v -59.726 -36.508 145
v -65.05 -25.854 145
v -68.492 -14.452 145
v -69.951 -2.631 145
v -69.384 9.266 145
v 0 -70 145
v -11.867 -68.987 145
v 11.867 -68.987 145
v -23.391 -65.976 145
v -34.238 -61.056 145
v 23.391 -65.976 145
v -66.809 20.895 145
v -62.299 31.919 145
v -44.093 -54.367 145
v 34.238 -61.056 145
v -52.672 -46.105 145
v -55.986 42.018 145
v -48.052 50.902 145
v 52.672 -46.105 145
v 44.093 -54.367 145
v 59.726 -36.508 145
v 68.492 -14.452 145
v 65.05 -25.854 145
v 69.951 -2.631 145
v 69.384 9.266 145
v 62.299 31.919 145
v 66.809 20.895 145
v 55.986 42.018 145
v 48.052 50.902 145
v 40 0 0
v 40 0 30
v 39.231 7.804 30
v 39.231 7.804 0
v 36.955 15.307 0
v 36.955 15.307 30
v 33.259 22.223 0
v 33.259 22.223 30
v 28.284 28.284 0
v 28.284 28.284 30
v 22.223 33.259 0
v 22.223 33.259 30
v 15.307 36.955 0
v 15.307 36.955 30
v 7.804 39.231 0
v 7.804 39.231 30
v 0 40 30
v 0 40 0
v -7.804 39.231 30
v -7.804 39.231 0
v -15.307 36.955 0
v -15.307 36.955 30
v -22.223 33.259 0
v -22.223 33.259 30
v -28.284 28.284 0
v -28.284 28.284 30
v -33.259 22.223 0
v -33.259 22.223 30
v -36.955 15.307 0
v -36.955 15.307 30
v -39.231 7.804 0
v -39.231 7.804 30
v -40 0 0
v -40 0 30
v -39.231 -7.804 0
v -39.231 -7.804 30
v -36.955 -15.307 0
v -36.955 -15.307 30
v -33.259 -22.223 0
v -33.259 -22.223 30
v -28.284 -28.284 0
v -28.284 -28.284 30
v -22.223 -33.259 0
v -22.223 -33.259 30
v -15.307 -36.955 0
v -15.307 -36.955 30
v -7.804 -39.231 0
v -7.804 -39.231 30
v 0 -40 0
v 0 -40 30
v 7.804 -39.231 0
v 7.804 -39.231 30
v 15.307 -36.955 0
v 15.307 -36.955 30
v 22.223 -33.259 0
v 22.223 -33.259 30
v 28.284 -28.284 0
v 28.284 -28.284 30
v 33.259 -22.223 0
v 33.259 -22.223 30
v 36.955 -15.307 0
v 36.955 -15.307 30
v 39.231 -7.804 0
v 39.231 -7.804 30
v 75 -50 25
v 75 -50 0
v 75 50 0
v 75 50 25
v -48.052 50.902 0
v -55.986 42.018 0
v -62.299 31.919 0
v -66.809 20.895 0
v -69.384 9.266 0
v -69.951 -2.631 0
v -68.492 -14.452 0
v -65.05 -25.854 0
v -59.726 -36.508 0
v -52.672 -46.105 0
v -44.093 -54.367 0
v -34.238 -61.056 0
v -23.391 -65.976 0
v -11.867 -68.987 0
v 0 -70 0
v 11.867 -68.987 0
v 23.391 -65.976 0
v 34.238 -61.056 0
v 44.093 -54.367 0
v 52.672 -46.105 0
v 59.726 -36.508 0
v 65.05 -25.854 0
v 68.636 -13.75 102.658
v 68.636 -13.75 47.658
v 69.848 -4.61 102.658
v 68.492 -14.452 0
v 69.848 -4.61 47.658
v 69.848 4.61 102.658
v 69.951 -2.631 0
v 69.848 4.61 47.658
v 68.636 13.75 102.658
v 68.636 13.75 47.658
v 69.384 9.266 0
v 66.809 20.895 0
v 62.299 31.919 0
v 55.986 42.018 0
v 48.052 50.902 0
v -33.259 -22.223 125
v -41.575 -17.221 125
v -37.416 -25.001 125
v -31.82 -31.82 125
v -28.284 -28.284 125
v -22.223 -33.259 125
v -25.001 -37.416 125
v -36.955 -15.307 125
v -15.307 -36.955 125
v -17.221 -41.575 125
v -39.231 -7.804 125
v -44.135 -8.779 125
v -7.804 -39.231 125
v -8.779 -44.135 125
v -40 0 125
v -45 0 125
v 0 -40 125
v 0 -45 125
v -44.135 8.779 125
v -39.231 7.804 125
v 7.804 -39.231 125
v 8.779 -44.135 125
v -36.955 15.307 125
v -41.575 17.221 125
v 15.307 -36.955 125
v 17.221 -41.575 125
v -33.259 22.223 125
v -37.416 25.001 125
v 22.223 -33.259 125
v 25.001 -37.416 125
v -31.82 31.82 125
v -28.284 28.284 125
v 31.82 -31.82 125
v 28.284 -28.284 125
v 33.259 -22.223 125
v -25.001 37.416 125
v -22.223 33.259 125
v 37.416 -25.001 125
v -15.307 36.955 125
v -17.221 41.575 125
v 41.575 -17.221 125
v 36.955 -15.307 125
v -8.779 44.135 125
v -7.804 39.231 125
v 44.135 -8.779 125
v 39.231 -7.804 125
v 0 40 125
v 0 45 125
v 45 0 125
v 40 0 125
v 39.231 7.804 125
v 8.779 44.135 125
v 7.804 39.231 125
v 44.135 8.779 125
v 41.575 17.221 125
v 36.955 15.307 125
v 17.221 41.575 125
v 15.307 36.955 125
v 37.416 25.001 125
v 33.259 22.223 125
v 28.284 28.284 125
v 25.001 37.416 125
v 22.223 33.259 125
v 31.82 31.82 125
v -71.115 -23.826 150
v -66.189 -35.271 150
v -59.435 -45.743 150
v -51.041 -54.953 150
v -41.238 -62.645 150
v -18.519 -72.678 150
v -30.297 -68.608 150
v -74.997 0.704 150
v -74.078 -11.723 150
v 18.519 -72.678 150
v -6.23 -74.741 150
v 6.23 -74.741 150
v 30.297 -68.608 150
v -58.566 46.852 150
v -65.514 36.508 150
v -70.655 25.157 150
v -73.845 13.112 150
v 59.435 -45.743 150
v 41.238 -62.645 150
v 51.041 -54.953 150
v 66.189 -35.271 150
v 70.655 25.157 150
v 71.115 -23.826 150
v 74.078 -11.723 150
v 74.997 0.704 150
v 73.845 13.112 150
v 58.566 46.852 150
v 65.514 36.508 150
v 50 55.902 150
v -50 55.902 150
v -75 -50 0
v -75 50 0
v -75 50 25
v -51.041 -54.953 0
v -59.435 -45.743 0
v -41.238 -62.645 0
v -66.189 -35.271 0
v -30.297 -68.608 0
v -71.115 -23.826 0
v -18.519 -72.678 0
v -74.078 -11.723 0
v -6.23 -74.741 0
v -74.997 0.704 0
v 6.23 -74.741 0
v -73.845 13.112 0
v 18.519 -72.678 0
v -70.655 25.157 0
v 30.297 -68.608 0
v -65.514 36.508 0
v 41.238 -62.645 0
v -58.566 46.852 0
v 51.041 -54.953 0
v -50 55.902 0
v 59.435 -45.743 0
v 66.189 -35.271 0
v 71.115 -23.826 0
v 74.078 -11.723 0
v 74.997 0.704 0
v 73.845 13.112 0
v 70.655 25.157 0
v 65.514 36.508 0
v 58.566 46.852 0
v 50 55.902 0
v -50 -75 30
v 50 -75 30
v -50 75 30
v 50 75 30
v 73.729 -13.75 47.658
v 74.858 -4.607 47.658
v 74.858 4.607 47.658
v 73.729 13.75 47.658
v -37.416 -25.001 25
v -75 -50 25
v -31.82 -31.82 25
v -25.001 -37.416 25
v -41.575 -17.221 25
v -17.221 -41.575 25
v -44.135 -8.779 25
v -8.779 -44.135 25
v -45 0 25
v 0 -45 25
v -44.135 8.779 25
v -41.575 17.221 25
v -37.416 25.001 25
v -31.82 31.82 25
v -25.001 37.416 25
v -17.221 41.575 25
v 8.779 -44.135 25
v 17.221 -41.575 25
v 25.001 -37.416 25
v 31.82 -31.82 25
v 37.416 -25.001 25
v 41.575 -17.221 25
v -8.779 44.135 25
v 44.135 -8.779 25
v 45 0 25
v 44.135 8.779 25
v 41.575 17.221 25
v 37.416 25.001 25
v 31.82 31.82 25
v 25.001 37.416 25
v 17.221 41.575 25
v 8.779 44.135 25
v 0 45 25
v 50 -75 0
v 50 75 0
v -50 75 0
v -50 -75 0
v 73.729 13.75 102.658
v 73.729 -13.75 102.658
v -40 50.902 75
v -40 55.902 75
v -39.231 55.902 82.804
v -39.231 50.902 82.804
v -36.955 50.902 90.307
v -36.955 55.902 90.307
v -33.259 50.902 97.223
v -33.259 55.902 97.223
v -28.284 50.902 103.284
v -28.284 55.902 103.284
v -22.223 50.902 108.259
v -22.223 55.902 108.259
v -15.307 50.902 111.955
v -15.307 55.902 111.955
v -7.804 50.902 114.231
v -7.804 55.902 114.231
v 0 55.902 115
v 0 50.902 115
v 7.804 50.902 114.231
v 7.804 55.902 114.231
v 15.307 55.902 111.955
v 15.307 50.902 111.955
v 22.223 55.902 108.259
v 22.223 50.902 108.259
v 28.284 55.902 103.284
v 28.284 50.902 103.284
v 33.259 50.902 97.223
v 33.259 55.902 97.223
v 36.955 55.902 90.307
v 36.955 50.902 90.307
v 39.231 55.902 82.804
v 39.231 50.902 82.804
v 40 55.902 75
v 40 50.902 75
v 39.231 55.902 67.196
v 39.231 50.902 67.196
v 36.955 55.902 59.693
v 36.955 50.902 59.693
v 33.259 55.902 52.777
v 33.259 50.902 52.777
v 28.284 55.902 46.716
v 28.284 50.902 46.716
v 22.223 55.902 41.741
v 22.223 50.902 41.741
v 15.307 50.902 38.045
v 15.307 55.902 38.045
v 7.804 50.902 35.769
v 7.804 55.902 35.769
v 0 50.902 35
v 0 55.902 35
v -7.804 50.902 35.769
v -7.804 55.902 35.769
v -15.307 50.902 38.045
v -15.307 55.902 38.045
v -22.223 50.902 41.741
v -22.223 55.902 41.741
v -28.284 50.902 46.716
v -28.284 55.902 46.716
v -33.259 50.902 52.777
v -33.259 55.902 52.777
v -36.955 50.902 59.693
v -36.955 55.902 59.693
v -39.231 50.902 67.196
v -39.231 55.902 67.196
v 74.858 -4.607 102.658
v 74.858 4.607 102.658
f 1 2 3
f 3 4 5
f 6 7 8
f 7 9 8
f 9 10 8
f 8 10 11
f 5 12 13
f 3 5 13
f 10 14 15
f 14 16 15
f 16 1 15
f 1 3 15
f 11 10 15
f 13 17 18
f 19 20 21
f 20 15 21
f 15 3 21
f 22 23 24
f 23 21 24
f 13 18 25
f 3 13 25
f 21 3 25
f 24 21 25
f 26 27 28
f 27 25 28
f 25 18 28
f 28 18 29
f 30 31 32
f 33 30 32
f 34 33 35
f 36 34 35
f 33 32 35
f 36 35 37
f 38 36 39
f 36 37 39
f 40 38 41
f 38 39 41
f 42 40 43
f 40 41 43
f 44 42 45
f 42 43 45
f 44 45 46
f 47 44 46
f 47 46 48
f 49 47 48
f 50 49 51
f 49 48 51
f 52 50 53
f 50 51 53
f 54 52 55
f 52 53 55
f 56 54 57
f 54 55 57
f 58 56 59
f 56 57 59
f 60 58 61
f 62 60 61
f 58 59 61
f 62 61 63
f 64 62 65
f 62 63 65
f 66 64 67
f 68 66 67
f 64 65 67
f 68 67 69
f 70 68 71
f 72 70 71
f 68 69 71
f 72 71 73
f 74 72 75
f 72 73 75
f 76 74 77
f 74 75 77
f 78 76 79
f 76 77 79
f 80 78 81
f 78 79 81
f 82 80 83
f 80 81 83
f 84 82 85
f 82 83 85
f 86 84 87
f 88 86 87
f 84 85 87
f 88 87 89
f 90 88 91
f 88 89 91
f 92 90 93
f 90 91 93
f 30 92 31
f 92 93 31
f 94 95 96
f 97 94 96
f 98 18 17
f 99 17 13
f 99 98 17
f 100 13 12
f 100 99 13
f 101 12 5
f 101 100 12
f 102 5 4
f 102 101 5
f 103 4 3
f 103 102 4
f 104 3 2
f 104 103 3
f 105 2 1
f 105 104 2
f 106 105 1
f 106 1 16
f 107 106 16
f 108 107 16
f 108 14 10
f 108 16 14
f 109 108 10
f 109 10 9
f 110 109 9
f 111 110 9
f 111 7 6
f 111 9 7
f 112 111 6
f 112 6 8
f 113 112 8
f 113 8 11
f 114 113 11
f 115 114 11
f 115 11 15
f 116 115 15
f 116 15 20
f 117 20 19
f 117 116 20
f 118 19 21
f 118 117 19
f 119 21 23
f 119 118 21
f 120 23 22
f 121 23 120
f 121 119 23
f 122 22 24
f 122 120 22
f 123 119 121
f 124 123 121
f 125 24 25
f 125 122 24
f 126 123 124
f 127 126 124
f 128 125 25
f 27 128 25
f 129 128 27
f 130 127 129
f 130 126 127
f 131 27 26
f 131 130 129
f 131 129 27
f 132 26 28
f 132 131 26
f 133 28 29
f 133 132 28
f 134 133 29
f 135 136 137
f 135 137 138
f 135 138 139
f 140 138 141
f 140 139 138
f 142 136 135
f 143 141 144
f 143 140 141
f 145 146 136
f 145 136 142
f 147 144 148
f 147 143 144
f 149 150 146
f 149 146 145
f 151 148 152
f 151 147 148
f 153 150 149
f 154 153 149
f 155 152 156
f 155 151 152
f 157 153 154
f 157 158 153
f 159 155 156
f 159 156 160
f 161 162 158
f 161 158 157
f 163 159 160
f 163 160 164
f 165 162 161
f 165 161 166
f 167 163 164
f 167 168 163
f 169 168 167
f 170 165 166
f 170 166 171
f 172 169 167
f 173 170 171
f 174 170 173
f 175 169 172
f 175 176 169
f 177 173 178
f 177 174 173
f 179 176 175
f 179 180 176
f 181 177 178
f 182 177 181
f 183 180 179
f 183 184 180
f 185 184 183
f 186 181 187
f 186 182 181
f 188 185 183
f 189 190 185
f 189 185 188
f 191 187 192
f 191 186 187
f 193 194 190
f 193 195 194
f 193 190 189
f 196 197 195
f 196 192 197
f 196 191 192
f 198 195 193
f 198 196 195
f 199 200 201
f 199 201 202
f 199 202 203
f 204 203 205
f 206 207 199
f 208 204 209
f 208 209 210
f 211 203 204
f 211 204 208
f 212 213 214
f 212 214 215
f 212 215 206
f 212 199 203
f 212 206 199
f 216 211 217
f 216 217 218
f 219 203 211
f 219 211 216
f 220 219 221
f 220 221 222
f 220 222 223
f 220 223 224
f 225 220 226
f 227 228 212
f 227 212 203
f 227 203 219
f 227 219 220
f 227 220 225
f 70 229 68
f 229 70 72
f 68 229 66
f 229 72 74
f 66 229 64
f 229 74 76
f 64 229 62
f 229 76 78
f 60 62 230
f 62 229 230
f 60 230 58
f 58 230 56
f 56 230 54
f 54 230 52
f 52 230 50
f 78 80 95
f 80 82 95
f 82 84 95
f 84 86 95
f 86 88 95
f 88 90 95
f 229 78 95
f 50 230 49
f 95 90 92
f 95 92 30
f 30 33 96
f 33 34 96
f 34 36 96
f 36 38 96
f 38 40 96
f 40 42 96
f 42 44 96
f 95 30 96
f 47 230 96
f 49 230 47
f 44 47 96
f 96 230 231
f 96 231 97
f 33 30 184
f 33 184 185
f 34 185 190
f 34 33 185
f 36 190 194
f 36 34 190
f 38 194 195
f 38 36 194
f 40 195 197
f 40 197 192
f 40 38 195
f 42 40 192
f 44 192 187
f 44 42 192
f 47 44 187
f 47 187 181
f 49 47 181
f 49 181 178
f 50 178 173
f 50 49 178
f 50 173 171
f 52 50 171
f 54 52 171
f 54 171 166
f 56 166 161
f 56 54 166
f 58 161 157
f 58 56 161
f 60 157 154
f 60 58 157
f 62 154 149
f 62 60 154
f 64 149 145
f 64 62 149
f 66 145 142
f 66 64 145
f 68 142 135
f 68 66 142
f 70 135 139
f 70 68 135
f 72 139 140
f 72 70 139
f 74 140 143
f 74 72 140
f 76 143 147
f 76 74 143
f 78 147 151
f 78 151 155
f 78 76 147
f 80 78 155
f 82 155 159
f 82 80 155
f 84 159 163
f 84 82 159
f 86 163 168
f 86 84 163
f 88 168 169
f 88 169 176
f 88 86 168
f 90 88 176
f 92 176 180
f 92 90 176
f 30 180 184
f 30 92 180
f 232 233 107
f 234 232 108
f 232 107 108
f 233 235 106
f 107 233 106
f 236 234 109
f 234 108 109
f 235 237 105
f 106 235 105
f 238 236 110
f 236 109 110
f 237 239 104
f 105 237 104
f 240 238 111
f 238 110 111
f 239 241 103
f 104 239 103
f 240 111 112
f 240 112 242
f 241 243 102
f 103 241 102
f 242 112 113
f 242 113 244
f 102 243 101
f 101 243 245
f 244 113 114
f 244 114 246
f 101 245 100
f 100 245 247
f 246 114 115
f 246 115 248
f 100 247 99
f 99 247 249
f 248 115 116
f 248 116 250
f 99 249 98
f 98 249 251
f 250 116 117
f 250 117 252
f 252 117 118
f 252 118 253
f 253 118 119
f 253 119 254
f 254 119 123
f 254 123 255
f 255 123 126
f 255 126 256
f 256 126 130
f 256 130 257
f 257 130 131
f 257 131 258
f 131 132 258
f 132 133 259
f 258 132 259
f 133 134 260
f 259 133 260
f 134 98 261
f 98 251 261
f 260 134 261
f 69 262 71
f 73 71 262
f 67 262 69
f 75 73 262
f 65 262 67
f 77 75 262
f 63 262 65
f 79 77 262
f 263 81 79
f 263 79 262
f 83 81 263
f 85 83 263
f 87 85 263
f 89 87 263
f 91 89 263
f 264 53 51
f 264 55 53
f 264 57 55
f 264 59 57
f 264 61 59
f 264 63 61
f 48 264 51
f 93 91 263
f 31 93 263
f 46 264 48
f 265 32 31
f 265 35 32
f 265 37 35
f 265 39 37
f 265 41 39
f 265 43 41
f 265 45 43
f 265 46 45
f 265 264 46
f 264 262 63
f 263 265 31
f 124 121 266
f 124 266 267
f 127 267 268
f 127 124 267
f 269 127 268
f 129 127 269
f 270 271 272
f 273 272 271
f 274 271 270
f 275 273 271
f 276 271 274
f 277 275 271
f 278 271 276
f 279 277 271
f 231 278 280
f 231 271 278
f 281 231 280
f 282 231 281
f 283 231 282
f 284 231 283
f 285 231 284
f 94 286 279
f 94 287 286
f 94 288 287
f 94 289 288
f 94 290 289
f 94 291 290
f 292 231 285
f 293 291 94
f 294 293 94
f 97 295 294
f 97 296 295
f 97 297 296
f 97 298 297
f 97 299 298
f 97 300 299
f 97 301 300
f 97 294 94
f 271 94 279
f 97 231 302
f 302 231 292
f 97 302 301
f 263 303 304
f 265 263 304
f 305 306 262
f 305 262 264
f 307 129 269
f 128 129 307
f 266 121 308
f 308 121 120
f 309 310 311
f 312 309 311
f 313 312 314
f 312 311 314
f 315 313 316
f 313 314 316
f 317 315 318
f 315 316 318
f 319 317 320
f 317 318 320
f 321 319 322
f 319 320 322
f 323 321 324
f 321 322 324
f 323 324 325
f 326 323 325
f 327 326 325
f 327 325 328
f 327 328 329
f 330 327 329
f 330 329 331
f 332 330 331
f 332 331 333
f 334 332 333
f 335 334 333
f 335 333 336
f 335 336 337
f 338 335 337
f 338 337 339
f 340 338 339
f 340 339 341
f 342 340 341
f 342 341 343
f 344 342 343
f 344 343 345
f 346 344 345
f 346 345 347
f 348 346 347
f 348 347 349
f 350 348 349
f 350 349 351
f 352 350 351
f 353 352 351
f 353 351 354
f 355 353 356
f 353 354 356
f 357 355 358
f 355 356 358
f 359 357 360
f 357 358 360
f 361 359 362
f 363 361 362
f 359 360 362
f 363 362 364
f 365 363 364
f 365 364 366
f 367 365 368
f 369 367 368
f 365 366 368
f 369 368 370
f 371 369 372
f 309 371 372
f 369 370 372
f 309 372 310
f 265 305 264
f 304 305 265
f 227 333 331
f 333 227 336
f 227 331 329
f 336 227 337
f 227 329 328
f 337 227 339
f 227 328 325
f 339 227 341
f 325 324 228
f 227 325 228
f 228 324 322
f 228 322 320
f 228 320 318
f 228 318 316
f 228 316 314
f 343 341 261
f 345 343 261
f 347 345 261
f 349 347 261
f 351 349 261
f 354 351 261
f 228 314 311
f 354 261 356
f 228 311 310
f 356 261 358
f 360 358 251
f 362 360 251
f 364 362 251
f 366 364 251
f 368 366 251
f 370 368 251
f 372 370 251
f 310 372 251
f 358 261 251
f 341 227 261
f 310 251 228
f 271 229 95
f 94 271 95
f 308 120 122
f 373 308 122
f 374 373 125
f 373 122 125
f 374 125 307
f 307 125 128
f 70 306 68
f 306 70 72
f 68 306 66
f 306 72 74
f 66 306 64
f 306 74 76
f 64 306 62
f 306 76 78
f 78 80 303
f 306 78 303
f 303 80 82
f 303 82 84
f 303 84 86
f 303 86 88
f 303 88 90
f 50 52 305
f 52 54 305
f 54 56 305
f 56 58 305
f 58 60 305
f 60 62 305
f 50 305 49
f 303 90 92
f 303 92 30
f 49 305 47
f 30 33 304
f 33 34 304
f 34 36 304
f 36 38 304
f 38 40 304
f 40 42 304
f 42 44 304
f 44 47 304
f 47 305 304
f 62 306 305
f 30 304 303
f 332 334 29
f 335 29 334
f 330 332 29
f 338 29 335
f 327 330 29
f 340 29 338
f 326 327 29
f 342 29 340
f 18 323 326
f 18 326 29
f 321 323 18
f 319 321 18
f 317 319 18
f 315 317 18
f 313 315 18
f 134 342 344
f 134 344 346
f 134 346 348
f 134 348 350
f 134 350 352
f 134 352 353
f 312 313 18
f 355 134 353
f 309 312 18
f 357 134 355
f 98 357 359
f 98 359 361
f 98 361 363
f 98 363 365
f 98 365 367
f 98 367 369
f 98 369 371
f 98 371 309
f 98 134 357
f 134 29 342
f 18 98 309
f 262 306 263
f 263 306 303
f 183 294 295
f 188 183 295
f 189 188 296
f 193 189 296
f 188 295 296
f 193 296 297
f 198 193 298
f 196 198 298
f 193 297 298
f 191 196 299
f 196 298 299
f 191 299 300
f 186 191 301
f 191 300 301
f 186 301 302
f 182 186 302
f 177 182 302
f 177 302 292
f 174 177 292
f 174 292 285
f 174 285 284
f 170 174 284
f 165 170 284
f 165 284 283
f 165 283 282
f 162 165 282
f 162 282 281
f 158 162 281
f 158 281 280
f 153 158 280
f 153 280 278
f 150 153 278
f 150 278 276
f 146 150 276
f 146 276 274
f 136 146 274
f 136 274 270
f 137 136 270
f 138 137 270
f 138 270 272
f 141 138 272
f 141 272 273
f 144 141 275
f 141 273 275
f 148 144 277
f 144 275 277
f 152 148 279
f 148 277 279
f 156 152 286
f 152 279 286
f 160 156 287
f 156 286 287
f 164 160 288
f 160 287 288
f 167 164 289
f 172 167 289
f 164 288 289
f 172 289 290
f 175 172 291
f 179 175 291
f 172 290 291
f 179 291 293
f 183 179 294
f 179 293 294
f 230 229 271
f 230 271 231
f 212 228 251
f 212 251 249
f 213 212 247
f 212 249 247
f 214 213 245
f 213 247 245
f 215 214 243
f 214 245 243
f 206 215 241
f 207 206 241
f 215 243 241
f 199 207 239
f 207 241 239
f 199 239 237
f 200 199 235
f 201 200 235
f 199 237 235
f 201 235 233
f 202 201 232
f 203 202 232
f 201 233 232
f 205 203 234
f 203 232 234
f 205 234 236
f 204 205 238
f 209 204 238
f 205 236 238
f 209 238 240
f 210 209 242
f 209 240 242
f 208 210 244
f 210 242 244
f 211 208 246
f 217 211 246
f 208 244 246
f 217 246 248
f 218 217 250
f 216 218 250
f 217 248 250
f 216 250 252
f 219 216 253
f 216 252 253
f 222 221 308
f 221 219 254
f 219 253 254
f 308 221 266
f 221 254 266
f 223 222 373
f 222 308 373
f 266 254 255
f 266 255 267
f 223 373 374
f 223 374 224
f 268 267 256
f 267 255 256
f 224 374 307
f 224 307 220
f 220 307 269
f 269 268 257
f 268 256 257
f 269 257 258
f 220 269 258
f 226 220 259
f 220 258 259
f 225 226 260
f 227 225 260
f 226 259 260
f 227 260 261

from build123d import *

# Parameters (mm, degrees)
F1_DEPTH  = 150
F2_T      = -5
F4_DEPTH  = 25
F5_W      = 100
F5_H      = 150
F6_DEPTH  = 30
F7_R      = 40
F8_DEPTH  = 30
F9_W      = 27.5
F9_H      = 55
F10_DEPTH = 100
F11_W     = 150
F11_H     = 100
F11_R     = 45
F12_DEPTH = 25
F11_R_2   = 40
F13_DEPTH = 125


with BuildPart() as f1:
    # F0 (on Top) → F1 (new body)
    with BuildSketch(Plane.XY):
        with BuildLine():
            Line((50, 55.9016994375), (-50, 55.9016994375))
            ThreePointArc((-50, 55.9016994375), (0, -75), (50, 55.9016994375))
        make_face()
    extrude(amount=F1_DEPTH)

    # F2
    f2_openings = [f1.faces().sort_by_distance(p)[0] for p in [
        (0, -5.093156, 0),
    ]]
    offset(amount=F2_T, openings=f2_openings)

    # F3 (on face) → F4 (cut)
    with BuildSketch(Plane(origin=(0, 55.9016994375, 0), x_dir=(-1, 0, 0), z_dir=(0, 1, 0))):
        with BuildLine():
            ThreePointArc((0, 114.9999955297), (-28.2842712475, 46.7157242822), (40, 74.9999955297))
            ThreePointArc((40, 74.9999955297), (28.2842712475, 103.2842667771), (0, 114.9999955297))
        make_face()
    extrude(amount=-F4_DEPTH, mode=Mode.SUBTRACT)

    # F9 (on Right) → F10 (cut)
    with BuildSketch(Plane.YZ):
        with Locations((0, 75.1577168703)):
            Rectangle(F9_W, F9_H)
    extrude(amount=F10_DEPTH, mode=Mode.SUBTRACT)


with BuildPart() as f6:
    # F5 (on Top) → F6 (new body)
    with BuildSketch(Plane.XY):
        Rectangle(F5_W, F5_H)
    extrude(amount=F6_DEPTH)

    # F7 (on face) → F8 (cut)
    with BuildSketch(Plane.XY.offset(30)):
        Circle(F7_R)
    extrude(amount=-F8_DEPTH, mode=Mode.SUBTRACT)


with BuildPart() as f12:
    # F11 (on Top) → F12 (new body)
    with BuildSketch(Plane.XY):
        Rectangle(F11_W, F11_H)
        Circle(F11_R, mode=Mode.SUBTRACT)
    extrude(amount=F12_DEPTH)

    # F11 (on Top) → F13 (join)
    with BuildSketch(Plane.XY):
        Circle(F11_R)
        Circle(F11_R_2, mode=Mode.SUBTRACT)
    extrude(amount=F13_DEPTH)


solid = Compound([f1.part, f6.part, f12.part])
